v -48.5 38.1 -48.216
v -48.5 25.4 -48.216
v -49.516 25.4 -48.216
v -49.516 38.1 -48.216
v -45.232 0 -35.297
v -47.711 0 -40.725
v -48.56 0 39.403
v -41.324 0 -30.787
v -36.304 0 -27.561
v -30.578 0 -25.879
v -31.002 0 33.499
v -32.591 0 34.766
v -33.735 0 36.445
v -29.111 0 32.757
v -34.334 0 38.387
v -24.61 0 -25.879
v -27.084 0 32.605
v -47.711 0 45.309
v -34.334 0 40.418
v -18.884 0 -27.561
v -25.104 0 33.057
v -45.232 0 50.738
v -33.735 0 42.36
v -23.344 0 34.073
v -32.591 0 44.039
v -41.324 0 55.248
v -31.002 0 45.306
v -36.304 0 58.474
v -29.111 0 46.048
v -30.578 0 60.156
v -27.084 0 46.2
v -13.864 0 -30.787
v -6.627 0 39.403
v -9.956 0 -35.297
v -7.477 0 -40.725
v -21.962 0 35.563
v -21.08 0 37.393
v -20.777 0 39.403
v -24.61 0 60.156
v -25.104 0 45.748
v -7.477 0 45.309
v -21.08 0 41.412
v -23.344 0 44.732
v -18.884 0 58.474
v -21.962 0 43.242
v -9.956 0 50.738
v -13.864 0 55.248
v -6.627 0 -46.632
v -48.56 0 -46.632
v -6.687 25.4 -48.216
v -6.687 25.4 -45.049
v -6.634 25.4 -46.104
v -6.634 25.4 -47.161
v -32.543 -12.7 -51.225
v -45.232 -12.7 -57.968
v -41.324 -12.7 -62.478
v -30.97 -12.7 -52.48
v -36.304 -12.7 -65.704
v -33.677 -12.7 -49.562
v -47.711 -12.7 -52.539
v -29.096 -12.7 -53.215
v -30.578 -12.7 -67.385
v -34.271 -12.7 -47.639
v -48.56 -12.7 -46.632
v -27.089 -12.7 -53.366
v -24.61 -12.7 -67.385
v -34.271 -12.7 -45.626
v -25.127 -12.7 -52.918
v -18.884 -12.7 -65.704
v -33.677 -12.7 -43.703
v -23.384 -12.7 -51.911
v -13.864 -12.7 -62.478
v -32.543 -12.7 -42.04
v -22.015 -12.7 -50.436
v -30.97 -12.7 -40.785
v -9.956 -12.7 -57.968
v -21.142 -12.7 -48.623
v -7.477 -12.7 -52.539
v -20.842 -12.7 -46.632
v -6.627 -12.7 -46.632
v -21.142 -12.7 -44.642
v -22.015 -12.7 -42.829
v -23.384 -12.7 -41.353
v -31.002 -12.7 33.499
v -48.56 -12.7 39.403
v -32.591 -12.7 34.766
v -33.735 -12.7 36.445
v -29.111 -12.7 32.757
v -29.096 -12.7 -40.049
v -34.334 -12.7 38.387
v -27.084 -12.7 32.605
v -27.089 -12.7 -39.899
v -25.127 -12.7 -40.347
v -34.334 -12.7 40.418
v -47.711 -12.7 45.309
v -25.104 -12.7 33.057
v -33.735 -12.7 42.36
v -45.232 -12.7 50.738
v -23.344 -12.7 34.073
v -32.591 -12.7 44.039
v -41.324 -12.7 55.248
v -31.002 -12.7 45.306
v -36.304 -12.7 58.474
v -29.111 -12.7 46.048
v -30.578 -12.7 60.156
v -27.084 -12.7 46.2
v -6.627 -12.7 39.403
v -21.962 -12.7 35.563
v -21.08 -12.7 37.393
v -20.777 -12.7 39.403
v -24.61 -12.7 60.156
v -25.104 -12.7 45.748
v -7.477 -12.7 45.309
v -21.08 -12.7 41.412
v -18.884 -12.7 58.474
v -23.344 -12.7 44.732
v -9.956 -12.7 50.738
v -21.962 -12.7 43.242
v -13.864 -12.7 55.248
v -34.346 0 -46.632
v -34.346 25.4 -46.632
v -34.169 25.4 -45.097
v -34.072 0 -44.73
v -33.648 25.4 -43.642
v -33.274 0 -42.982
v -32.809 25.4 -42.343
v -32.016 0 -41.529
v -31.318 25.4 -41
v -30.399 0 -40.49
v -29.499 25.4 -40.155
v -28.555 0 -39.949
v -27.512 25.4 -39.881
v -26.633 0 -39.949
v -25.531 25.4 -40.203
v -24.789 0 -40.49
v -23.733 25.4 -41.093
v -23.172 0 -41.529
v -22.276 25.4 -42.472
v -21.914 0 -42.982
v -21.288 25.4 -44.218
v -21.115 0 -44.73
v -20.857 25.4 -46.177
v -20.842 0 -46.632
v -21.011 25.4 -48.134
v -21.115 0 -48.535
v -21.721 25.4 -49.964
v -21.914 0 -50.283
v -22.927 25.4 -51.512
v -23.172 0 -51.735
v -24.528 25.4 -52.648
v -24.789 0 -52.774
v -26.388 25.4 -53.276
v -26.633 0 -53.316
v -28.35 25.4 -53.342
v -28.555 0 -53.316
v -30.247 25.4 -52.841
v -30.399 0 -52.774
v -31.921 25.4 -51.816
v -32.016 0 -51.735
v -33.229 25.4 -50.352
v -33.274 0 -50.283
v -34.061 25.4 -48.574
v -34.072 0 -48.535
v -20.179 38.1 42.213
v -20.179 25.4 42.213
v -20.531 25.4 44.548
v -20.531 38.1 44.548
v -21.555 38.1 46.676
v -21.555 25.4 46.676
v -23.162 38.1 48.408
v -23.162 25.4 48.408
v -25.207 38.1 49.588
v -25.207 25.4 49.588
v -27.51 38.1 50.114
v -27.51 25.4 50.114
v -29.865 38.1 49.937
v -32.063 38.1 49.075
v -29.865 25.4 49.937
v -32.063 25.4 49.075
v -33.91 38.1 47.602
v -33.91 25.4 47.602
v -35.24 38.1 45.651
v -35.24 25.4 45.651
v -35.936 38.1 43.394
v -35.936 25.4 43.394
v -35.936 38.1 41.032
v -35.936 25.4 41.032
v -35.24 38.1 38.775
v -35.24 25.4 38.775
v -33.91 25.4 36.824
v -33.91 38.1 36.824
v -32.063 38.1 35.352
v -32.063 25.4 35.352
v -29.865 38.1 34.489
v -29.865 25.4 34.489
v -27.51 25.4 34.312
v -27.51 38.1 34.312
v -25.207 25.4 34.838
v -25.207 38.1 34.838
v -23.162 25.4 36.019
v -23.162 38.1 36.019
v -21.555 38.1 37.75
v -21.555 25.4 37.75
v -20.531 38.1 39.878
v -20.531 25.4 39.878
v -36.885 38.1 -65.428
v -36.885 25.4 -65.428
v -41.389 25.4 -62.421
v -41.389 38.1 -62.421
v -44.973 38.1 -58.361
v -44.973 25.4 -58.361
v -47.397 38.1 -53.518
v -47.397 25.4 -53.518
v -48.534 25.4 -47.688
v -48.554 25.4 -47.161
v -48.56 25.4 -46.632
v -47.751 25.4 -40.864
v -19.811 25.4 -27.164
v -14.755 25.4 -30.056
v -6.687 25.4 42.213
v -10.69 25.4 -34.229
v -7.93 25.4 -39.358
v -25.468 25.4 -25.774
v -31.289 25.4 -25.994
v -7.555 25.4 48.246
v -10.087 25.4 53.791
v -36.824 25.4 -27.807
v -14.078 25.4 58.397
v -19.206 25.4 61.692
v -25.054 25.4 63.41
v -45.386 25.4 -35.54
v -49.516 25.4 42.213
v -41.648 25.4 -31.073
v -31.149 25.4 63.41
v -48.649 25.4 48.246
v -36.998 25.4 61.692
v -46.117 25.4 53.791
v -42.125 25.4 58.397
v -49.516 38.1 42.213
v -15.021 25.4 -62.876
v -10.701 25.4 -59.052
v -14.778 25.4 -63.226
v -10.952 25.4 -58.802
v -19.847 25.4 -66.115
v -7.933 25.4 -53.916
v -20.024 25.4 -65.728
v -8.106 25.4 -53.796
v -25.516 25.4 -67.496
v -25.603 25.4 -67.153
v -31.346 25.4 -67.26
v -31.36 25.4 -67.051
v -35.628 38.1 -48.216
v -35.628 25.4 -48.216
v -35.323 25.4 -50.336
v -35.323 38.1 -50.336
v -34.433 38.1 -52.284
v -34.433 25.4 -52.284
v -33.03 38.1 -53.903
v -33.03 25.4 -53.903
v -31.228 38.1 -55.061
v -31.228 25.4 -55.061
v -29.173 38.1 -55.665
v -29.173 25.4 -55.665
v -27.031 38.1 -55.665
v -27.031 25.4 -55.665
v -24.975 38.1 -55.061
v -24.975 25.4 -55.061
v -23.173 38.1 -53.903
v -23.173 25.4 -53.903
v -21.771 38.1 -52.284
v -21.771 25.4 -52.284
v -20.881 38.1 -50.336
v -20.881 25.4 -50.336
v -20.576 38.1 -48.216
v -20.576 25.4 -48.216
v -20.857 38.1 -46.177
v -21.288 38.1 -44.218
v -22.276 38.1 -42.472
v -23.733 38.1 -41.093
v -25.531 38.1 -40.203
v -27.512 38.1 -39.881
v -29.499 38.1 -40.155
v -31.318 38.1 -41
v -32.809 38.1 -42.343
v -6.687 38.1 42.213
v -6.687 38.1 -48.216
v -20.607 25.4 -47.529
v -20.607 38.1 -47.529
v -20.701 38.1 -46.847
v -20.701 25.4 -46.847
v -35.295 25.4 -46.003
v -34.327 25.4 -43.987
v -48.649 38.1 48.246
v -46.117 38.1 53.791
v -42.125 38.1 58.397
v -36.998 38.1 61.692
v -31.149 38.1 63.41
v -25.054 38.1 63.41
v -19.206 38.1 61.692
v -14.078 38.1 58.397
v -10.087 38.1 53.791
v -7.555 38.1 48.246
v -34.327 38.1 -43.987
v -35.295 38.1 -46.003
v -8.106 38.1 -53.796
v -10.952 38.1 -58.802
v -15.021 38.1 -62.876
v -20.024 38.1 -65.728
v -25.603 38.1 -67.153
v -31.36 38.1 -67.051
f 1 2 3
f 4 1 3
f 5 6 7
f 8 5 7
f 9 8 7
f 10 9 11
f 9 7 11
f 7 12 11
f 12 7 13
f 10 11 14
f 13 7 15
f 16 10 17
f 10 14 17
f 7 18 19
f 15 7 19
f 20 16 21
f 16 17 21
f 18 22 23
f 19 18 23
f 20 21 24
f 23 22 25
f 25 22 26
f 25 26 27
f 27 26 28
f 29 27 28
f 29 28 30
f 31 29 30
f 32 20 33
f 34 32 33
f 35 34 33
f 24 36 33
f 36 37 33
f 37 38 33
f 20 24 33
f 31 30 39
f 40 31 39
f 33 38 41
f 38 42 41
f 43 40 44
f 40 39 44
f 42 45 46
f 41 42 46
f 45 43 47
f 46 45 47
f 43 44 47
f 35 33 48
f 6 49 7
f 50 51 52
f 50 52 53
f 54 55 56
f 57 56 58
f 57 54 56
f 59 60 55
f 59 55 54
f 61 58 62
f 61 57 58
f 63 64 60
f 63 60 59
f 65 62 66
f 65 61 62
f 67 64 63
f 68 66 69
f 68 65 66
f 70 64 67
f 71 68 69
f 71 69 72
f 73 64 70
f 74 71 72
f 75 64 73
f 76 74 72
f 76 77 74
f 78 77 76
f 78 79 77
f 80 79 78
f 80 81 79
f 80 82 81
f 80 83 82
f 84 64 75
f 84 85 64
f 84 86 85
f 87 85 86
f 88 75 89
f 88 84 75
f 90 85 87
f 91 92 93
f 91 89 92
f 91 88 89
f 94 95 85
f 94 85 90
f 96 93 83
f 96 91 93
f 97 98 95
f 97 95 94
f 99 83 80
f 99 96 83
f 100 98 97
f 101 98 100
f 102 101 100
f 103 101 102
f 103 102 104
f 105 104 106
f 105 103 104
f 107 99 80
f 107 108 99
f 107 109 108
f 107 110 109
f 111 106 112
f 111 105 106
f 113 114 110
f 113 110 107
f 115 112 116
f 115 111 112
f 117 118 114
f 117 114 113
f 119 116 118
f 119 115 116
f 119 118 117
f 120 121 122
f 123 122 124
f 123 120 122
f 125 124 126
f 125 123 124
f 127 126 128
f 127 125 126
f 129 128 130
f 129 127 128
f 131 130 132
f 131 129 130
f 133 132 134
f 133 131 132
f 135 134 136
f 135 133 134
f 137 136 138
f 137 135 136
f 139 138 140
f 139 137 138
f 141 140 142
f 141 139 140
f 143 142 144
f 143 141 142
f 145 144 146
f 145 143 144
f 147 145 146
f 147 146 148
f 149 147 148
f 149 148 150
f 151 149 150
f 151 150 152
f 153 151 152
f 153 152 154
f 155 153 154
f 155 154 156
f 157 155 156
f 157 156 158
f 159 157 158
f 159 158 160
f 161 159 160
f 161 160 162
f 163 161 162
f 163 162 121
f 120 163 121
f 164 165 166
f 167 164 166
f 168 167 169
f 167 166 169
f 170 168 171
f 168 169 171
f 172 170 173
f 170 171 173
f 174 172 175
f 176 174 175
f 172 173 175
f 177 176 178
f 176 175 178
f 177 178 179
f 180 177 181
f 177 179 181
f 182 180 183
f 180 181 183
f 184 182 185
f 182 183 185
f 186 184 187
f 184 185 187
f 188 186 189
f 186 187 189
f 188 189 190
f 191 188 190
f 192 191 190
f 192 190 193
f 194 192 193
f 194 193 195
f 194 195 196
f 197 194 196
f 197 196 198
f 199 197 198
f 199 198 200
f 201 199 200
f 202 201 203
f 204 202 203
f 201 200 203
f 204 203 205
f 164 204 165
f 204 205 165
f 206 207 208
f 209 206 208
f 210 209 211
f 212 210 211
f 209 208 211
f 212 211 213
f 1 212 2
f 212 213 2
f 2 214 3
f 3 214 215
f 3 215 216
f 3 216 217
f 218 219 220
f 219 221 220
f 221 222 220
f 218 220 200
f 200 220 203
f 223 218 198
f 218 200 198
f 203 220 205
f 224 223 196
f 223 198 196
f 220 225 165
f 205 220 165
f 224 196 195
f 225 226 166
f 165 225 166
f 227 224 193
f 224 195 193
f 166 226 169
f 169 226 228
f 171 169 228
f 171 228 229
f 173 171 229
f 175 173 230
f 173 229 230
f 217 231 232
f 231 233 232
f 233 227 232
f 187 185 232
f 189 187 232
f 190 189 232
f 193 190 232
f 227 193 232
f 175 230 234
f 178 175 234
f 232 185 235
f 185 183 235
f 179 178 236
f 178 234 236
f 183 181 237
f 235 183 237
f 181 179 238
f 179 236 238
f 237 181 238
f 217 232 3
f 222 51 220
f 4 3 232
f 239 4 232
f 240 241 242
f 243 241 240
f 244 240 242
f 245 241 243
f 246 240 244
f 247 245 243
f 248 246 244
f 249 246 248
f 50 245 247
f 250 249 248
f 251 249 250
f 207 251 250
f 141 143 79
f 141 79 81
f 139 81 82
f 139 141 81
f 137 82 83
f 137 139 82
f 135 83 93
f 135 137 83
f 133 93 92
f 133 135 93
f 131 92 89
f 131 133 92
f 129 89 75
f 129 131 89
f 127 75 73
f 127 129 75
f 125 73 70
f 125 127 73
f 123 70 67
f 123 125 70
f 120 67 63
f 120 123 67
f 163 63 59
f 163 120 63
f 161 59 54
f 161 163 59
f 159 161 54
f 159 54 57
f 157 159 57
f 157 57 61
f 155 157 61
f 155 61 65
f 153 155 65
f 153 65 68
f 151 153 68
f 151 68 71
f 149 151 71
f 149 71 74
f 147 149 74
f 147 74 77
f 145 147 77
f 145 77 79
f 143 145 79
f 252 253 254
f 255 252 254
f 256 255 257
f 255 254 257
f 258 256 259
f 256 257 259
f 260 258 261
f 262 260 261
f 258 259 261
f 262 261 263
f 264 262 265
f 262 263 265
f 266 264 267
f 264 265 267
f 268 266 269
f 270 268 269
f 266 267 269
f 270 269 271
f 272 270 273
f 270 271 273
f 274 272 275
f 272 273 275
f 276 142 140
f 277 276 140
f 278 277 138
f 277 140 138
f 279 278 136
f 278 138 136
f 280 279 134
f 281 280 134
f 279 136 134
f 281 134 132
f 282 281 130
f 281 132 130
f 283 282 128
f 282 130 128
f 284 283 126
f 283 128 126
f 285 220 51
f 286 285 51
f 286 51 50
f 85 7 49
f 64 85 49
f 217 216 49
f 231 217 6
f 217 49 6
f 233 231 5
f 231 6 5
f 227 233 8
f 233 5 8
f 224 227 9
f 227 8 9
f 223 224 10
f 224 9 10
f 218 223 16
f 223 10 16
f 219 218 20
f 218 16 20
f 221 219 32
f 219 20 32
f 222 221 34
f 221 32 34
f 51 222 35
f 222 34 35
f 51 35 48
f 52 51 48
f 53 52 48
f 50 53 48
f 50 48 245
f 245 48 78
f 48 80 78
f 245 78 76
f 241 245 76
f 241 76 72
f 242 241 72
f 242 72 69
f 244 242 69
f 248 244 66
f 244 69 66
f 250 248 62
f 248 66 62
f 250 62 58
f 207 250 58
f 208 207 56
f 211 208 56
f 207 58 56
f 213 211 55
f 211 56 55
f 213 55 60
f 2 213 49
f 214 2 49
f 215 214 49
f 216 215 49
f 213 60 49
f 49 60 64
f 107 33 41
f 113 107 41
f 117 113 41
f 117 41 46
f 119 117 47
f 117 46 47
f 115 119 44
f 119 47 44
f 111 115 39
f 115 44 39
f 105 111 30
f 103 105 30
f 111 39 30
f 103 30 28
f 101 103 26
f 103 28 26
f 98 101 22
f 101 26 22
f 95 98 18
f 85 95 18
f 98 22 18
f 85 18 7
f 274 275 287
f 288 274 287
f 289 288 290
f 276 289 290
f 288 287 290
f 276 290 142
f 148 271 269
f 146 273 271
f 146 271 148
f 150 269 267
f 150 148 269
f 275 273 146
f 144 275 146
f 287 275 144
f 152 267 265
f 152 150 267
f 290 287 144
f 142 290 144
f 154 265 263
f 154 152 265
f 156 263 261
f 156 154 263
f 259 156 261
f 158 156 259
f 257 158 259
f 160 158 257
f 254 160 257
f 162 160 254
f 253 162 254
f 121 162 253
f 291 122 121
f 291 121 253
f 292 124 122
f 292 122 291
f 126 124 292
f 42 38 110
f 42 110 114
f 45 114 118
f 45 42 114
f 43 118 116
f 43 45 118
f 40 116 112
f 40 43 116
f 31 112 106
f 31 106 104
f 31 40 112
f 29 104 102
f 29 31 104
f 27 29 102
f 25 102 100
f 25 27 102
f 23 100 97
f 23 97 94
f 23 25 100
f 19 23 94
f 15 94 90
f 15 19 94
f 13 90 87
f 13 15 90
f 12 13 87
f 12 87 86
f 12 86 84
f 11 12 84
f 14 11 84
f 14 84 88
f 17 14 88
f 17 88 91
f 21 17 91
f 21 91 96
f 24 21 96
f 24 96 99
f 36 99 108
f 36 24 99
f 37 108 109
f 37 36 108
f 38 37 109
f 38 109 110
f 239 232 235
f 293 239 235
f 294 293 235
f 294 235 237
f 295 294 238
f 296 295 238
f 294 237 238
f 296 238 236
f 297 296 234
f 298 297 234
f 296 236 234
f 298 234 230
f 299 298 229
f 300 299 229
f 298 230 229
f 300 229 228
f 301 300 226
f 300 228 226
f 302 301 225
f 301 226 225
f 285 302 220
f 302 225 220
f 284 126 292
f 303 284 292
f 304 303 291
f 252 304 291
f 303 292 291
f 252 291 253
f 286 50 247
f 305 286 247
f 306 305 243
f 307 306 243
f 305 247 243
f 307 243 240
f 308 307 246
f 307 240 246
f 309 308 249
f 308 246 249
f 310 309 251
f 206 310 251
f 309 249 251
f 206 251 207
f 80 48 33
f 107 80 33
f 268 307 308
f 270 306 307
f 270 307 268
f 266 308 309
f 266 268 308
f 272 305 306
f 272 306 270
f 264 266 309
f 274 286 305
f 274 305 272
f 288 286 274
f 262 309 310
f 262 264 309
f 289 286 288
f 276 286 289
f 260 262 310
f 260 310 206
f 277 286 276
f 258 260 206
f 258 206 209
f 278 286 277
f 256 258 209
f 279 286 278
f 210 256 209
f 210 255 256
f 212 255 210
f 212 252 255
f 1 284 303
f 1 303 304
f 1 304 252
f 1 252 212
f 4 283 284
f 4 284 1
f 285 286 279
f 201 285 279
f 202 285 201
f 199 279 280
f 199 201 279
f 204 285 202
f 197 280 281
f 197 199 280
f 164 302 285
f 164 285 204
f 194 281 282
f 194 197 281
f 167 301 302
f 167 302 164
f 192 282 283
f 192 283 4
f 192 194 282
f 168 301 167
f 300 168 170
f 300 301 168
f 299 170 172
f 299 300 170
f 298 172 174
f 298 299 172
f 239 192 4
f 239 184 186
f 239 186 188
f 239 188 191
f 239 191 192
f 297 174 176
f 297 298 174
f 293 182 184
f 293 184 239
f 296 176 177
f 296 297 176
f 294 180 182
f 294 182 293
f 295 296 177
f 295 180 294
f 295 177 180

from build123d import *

# Parameters (mm, degrees)
F0_R     = 6.7521335394
F0_R_2   = 6.8163388515
F1_DEPTH = 12.7
F2_R     = 6.7521335394
F3_DEPTH = 25.4
F5_DEPTH = 12.7


# Not quite as in the source:
# - a length typed as a fraction of an inch, garbled in the dataset ("3 / 203.2 mm" for 3/8 in), is restored


with BuildPart() as f1:
    # F0 (on Front) → F1 (new body)
    with BuildSketch(Plane.XZ):
        with BuildLine():
            ThreePointArc((-6.6273338161, 39.4025146961), (-27.5938108098, 60.3689916898), (-48.5602878034, 39.4025146961))
            Line((-48.5602878034, 39.4025146961), (-48.5602878034, -46.63233459))
            ThreePointArc((-48.5602878034, -46.63233459), (-27.5938108098, -67.5988115836), (-6.6273338161, -46.63233459))
            Line((-6.6273338161, -46.63233459), (-6.6273338161, 39.4025146961))
        make_face()
        with Locations((-27.5938108098, -46.63233459)):
            Circle(F0_R, mode=Mode.SUBTRACT)
        with Locations((-27.5938108098, 39.4025146961)):
            Circle(F0_R_2, mode=Mode.SUBTRACT)
    extrude(amount=F1_DEPTH)

    # F2 (on face) → F3 (join)
    with BuildSketch(Plane(origin=(0, 0, 0), x_dir=(-1, 0, 0), z_dir=(0, 1, 0))):
        with BuildLine():
            ThreePointArc((6.6273338161, -46.63233459), (27.5938108098, -67.5988115836), (48.5602878034, -46.63233459))
            ThreePointArc((48.5602878034, -46.63233459), (27.5938108098, -25.6658575963), (6.6273338161, -46.63233459))
        make_face()
        with Locations((27.5938108098, -46.63233459)):
            Circle(F2_R, mode=Mode.SUBTRACT)
    extrude(amount=F3_DEPTH)

    # F4 (on face) → F5 (join)
    with BuildSketch(Plane(origin=(0, 25.4, 0), x_dir=(-1, 0, 0), z_dir=(0, 1, 0))):
        with BuildLine():
            Line((6.6871955224, -45.0491116899), (6.6871955224, -48.21555749))
            Line((6.6871955224, -48.21555749), (20.5757935859, -48.21555749))
            ThreePointArc((20.5757935859, -48.21555749), (20.6464307387, -47.1868562222), (20.8570162136, -46.1774654835))
            ThreePointArc((20.8570162136, -46.1774654835), (25.5313250881, -40.2029131555), (32.8088623121, -42.3434483519))
            ThreePointArc((32.8088623121, -42.3434483519), (34.8864096094, -44.9587614977), (35.6275880547, -48.21555749))
            Line((35.6275880547, -48.21555749), (48.5004260971, -48.21555749))
            ThreePointArc((48.5004260971, -48.21555749), (48.545317032, -47.4245116811), (48.5602878034, -46.63233459))
            ThreePointArc((48.5602878034, -46.63233459), (28.385987901, -25.6808283677), (6.6871955224, -45.0491116899))
        make_face()
        with BuildLine():
            Line((6.6871955224, 42.21310094), (6.6871955224, -45.0491116899))
            ThreePointArc((6.6871955224, -45.0491116899), (28.385987901, -25.6808283677), (48.5602878034, -46.63233459))
            ThreePointArc((48.5602878034, -46.63233459), (48.545317032, -47.4245116811), (48.5004260971, -48.21555749))
            Line((48.5004260971, -48.21555749), (49.5161861181, -48.21555749))
            Line((49.5161861181, -48.21555749), (49.5161861181, 42.21310094))
            Line((49.5161861181, 42.21310094), (36.0246261847, 42.21310094))
            ThreePointArc((36.0246261847, 42.21310094), (28.1016908203, 34.2901655755), (20.1787554558, 42.21310094))
            Line((20.1787554558, 42.21310094), (6.6871955224, 42.21310094))
        make_face()
        with BuildLine():
            Line((20.5757935859, -48.21555749), (6.6871955224, -48.21555749))
            ThreePointArc((6.6871955224, -48.21555749), (17.4268777521, -64.4696352981), (36.8849828604, -65.427740397))
            ThreePointArc((36.8849828604, -65.427740397), (44.9731491209, -58.3605807245), (48.5004260971, -48.21555749))
            Line((48.5004260971, -48.21555749), (35.6275880547, -48.21555749))
            ThreePointArc((35.6275880547, -48.21555749), (28.1016908203, -55.7414547244), (20.5757935859, -48.21555749))
        make_face()
        with BuildLine():
            ThreePointArc((49.5161861181, 42.21310094), (28.1016908203, 63.6275962378), (6.6871955224, 42.21310094))
            Line((6.6871955224, 42.21310094), (20.1787554558, 42.21310094))
            ThreePointArc((20.1787554558, 42.21310094), (28.1016908203, 50.1360363044), (36.0246261847, 42.21310094))
            Line((36.0246261847, 42.21310094), (49.5161861181, 42.21310094))
        make_face()
    extrude(amount=F5_DEPTH)


solid = f1.part
